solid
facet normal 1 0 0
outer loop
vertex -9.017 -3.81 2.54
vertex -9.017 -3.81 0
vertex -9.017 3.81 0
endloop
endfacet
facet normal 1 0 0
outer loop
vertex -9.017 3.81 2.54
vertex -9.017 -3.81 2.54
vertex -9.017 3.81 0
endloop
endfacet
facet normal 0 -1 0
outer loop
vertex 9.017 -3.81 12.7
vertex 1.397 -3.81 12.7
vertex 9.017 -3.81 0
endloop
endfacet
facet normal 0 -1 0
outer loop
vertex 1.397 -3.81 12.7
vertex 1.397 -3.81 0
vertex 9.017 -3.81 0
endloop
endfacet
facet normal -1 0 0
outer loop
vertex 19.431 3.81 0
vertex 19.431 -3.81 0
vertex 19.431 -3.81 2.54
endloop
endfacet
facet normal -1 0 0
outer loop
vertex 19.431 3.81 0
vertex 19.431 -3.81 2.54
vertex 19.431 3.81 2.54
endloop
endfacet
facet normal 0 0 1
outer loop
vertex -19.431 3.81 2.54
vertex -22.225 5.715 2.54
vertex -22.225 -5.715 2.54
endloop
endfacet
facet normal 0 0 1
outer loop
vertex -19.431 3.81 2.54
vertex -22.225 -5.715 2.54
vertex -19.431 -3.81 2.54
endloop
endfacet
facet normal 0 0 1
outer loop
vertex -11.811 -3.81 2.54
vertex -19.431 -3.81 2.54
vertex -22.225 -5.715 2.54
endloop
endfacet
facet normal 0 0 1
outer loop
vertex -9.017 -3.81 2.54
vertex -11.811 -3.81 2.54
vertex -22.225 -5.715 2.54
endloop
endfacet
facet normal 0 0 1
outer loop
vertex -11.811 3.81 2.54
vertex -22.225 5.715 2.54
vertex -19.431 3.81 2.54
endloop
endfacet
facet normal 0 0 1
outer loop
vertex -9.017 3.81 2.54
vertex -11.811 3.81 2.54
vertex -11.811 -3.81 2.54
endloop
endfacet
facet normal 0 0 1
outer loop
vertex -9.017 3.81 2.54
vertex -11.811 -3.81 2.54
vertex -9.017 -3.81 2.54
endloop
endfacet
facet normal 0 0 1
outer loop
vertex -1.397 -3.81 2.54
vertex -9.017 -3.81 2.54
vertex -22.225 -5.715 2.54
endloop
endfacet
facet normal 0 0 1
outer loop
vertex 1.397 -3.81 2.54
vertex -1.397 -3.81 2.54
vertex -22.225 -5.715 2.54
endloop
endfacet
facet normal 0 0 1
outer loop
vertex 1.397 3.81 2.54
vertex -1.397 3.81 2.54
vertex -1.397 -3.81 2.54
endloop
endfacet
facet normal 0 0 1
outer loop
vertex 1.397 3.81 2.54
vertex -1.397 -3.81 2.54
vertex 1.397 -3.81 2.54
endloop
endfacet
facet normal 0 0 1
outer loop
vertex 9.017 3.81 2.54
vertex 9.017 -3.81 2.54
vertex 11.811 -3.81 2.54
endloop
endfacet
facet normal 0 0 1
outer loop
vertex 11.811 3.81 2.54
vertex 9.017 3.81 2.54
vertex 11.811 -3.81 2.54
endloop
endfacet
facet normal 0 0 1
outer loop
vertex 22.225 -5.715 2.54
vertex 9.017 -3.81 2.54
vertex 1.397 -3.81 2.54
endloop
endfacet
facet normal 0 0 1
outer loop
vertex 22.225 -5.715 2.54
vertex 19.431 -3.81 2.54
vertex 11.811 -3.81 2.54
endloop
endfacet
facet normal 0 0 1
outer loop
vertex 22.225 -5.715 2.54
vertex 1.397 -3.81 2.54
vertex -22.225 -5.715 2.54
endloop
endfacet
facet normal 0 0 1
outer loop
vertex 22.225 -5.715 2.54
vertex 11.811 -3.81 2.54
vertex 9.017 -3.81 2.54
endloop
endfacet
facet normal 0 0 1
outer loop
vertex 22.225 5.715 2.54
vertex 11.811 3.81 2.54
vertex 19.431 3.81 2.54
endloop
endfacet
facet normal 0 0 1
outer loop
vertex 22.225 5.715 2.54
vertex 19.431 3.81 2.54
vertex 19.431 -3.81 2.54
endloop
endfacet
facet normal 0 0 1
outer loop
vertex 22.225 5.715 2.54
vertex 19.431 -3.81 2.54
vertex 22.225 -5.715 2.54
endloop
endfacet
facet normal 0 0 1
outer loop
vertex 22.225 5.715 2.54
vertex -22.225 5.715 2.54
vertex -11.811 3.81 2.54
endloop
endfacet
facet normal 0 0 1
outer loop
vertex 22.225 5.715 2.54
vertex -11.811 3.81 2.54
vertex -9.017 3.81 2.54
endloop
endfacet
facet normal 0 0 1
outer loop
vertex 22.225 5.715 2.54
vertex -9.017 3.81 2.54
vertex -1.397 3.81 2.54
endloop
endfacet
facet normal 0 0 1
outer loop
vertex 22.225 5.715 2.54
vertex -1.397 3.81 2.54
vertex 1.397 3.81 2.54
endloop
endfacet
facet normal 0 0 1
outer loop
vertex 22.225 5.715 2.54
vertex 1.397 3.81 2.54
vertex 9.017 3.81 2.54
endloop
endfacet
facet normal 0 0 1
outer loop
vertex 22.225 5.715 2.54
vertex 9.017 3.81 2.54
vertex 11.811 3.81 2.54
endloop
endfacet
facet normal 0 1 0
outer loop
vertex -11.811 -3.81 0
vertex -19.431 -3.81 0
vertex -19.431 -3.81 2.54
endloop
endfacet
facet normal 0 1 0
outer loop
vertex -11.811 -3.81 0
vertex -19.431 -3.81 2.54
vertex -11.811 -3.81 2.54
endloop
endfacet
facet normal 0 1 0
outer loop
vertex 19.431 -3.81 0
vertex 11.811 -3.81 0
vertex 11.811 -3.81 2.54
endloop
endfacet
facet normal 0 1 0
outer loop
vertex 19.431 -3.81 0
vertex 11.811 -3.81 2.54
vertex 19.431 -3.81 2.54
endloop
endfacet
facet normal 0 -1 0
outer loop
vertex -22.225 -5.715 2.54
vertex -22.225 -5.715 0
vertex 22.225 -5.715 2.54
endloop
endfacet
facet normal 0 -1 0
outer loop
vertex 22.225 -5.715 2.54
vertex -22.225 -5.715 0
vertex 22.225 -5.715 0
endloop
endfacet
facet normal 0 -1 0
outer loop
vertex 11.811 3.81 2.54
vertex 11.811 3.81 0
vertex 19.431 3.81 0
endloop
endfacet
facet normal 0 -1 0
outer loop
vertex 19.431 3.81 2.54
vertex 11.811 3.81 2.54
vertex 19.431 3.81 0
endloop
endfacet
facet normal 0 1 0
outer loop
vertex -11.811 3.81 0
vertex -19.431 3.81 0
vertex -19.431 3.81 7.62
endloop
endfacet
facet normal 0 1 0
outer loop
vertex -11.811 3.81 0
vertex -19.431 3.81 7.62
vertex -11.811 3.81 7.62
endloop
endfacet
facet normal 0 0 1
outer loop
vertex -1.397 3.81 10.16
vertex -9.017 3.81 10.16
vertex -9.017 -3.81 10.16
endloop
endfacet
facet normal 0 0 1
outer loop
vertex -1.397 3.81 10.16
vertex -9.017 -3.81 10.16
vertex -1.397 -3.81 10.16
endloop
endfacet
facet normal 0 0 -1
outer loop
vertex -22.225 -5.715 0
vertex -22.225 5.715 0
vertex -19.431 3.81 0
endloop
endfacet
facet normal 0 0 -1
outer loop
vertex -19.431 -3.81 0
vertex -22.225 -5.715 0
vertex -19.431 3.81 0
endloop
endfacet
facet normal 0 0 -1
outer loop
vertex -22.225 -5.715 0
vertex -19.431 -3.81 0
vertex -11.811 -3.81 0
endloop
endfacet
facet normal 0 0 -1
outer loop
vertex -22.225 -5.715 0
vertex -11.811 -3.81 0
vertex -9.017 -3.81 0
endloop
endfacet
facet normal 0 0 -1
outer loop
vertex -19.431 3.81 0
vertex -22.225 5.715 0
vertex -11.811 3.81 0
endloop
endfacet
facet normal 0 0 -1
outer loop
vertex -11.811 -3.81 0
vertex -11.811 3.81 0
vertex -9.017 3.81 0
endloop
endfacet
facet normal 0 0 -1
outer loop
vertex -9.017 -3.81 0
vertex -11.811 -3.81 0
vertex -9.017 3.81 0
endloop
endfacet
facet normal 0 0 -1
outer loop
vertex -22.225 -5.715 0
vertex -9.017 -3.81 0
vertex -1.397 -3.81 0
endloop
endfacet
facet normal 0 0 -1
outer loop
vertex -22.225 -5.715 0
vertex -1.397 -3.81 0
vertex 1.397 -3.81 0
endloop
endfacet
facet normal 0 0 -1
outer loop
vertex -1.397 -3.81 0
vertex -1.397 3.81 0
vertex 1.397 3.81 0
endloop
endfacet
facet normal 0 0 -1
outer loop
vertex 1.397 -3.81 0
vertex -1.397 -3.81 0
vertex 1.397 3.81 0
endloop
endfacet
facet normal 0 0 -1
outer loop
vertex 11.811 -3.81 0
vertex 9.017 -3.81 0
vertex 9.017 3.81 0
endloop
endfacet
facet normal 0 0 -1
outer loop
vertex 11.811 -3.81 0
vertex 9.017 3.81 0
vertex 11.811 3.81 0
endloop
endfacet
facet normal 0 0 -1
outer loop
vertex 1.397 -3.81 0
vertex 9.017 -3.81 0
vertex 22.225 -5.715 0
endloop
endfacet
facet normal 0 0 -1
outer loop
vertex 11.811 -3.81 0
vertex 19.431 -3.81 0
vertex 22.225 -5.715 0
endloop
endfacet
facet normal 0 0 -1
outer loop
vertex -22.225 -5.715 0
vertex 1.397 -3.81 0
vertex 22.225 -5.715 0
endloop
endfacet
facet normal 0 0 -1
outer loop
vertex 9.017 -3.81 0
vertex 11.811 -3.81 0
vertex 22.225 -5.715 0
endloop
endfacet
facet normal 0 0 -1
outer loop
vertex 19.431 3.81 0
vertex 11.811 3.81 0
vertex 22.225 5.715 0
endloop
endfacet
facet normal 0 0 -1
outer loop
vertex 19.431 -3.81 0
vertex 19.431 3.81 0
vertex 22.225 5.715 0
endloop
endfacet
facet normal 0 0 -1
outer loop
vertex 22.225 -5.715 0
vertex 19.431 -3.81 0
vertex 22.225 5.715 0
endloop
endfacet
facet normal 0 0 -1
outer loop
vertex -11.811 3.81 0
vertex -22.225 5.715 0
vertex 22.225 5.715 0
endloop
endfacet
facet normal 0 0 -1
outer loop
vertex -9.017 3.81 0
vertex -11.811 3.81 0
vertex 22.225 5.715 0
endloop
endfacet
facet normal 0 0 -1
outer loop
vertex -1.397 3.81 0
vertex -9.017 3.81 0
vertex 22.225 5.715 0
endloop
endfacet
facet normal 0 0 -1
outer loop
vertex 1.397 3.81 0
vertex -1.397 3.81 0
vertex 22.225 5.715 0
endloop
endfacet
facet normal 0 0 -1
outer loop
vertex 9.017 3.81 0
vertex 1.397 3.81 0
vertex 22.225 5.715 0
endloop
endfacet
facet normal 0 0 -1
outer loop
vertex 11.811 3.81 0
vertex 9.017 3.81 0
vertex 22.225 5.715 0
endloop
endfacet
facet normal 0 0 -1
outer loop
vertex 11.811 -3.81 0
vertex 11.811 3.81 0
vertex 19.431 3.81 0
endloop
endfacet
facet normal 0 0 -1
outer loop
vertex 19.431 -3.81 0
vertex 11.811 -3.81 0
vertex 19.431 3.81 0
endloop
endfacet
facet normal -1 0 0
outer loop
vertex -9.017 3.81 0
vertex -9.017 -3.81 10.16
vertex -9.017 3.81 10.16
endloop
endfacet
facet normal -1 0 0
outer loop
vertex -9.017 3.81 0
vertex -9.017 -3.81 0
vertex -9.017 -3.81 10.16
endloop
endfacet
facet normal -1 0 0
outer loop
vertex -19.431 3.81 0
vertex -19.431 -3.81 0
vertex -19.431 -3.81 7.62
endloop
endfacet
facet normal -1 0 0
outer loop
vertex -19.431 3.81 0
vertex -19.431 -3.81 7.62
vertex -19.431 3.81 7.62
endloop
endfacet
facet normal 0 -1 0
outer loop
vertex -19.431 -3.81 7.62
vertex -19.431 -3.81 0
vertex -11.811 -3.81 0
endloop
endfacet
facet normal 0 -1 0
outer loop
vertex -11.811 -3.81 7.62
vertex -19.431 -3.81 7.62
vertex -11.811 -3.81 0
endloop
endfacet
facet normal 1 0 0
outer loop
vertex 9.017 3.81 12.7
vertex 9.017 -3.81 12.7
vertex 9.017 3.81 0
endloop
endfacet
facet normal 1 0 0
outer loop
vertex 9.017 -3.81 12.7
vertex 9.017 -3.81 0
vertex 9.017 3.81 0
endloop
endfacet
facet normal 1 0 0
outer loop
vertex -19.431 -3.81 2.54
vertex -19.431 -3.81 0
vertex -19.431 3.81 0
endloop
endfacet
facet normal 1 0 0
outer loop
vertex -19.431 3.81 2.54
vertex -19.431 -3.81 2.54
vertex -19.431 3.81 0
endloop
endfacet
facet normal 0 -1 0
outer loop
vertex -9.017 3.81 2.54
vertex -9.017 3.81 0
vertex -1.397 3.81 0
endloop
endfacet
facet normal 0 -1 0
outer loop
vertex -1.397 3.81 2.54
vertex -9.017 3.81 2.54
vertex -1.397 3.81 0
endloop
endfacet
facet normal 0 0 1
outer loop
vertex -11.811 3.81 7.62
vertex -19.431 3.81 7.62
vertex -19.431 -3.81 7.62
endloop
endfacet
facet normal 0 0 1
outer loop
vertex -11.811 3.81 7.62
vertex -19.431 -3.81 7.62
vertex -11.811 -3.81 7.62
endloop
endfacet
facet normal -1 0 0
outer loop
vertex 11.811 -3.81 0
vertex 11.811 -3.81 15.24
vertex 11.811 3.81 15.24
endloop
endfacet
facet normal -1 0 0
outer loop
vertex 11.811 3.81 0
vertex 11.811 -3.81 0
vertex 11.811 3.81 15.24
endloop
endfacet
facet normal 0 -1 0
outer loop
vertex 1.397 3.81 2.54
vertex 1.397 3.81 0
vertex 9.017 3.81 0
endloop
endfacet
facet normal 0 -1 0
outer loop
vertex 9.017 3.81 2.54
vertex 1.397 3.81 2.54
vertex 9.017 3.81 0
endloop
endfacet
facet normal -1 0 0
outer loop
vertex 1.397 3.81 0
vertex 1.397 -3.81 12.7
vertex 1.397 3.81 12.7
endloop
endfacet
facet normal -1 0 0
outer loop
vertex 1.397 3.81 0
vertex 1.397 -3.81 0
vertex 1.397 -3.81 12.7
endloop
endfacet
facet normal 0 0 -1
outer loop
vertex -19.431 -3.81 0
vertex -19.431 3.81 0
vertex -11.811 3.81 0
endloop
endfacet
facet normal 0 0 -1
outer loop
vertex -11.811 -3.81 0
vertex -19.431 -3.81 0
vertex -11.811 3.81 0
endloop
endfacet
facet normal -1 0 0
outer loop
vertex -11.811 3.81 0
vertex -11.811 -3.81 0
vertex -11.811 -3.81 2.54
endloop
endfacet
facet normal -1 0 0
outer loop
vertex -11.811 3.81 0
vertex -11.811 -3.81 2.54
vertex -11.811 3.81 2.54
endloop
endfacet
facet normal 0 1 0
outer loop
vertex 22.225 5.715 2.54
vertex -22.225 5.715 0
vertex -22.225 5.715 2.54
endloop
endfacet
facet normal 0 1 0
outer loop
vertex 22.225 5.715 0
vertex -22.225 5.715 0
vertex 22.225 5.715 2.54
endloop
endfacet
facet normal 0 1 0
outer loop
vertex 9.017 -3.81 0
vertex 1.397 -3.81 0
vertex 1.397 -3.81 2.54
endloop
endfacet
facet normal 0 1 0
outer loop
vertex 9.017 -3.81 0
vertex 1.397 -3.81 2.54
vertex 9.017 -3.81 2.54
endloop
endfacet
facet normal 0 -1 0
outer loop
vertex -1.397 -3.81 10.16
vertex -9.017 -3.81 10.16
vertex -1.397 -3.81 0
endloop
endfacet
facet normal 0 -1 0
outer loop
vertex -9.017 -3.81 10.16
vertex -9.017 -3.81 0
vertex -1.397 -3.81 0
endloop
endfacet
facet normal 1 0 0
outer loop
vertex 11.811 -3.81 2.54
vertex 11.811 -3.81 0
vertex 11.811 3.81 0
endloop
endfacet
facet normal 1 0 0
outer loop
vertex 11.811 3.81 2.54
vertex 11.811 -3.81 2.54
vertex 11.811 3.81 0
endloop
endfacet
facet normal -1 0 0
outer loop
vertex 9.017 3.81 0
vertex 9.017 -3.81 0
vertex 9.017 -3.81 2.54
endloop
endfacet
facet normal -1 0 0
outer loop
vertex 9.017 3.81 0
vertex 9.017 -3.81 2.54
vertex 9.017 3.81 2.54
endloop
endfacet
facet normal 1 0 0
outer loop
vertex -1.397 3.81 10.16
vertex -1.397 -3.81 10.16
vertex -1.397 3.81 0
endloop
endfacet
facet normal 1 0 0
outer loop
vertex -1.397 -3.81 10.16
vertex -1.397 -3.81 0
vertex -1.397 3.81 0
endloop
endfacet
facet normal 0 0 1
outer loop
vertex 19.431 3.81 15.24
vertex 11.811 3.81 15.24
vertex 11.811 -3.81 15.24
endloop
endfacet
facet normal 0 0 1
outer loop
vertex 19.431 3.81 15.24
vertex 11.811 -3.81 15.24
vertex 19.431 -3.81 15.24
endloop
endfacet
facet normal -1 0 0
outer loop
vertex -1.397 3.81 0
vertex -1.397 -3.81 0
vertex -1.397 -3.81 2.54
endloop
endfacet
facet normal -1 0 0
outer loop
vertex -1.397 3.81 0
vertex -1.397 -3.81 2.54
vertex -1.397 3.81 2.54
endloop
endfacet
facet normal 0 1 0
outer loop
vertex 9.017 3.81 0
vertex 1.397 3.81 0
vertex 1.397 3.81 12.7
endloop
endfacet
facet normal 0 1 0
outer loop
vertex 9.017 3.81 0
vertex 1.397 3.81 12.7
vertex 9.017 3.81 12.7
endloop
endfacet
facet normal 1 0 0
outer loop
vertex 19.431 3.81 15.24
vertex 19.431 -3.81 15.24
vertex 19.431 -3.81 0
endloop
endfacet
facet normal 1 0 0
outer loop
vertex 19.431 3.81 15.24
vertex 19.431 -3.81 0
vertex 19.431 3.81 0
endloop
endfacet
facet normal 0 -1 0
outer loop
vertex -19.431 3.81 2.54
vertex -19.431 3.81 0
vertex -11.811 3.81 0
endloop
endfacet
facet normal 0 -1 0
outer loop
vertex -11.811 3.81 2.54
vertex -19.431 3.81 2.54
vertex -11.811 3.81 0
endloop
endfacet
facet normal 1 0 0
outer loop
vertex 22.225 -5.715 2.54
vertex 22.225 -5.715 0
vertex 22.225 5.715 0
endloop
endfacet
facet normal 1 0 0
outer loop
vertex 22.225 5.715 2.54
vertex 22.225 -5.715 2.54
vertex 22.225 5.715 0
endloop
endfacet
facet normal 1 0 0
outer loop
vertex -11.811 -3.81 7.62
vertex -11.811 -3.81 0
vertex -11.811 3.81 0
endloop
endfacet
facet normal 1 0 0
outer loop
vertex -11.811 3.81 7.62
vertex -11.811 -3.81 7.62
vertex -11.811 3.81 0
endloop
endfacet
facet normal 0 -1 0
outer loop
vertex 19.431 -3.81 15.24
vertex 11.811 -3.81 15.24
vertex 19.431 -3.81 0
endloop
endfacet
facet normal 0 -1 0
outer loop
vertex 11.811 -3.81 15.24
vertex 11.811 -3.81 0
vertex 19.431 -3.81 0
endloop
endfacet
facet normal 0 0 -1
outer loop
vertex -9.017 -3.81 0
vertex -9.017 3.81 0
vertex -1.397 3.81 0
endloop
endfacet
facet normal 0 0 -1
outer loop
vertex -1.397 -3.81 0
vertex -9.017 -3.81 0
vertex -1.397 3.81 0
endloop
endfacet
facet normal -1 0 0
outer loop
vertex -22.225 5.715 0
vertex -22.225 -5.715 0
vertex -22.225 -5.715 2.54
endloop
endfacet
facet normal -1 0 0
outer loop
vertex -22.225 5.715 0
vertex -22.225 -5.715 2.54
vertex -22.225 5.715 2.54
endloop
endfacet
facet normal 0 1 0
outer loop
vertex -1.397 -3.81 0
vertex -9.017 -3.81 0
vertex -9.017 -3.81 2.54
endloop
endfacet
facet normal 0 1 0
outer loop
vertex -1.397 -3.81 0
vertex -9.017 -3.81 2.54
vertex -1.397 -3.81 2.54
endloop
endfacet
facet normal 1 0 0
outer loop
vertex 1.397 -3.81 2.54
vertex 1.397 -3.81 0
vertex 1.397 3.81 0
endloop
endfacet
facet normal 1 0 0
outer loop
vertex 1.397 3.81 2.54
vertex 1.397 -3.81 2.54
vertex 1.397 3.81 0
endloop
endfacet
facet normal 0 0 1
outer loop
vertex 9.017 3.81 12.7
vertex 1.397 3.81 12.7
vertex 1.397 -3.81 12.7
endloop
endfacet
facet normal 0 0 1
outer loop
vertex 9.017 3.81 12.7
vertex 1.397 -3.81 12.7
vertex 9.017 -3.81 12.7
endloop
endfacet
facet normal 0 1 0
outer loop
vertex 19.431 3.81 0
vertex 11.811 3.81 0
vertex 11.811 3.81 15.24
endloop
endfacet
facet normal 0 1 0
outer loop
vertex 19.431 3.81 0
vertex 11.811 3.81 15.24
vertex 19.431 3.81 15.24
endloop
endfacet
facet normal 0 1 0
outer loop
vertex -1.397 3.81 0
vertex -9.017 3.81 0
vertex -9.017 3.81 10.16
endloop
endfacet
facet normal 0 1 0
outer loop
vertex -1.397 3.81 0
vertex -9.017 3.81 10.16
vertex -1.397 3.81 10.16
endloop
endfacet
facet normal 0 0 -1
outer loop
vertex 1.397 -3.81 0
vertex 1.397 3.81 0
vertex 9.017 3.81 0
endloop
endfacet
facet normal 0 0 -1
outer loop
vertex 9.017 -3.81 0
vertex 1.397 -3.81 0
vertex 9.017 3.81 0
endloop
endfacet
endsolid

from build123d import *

# Parameters (mm, degrees)
F0_W     = 7.62
F0_H     = 7.62
F1_DEPTH = 7.62
F2_DEPTH = 2.54
F3_DEPTH = 5.08
F4_DEPTH = 7.62
F0_W_2   = 44.45
F0_H_2   = 11.43
F5_DEPTH = 2.54


with BuildPart() as f1:
    # F0 (on Top) → F1 (new body)
    with BuildSketch(Plane.XY):
        with Locations((-5.207, 0)):
            Rectangle(F0_W, F0_H)
    extrude(amount=F1_DEPTH)

    # F2 (add): a face of the model
    f2_faces = [f1.faces().sort_by_distance(p)[0] for p in [
        (-5.207, 0, 7.62),
    ]]
    extrude(f2_faces, amount=F2_DEPTH)


with BuildPart() as f1b:
    # F0 (on Top) → F1, piece 2 (new body)
    with BuildSketch(Plane.XY):
        with Locations((-15.621, 0)):
            Rectangle(F0_W, F0_H)
    extrude(amount=F1_DEPTH)


with BuildPart() as f1c:
    # F0 (on Top) → F1, piece 3 (new body)
    with BuildSketch(Plane.XY):
        with Locations((5.207, 0)):
            Rectangle(F0_W, F0_H)
    extrude(amount=F1_DEPTH)

    # F3 (add): a face of the model
    f3_faces = [f1c.faces().sort_by_distance(p)[0] for p in [
        (5.207, 0, 7.62),
    ]]
    extrude(f3_faces, amount=F3_DEPTH)


with BuildPart() as f1d:
    # F0 (on Top) → F1, piece 4 (new body)
    with BuildSketch(Plane.XY):
        with Locations((15.621, 0)):
            Rectangle(F0_W, F0_H)
    extrude(amount=F1_DEPTH)

    # F4 (add): a face of the model
    f4_faces = [f1d.faces().sort_by_distance(p)[0] for p in [
        (15.621, 0, 7.62),
    ]]
    extrude(f4_faces, amount=F4_DEPTH)


with BuildPart() as f5:
    # F0 (on Top) → F5 (new body)
    with BuildSketch(Plane.XY):
        Rectangle(F0_W_2, F0_H_2)
        with Locations((-15.621, 0)):
            Rectangle(F0_W, F0_H, mode=Mode.SUBTRACT)
        with Locations((-5.207, 0)):
            Rectangle(F0_W, F0_H, mode=Mode.SUBTRACT)
        with Locations((5.207, 0)):
            Rectangle(F0_W, F0_H, mode=Mode.SUBTRACT)
        with Locations((15.621, 0)):
            Rectangle(F0_W, F0_H, mode=Mode.SUBTRACT)
    extrude(amount=F5_DEPTH)


solid = Compound([f1.part, f1b.part, f1c.part, f1d.part, f5.part])
